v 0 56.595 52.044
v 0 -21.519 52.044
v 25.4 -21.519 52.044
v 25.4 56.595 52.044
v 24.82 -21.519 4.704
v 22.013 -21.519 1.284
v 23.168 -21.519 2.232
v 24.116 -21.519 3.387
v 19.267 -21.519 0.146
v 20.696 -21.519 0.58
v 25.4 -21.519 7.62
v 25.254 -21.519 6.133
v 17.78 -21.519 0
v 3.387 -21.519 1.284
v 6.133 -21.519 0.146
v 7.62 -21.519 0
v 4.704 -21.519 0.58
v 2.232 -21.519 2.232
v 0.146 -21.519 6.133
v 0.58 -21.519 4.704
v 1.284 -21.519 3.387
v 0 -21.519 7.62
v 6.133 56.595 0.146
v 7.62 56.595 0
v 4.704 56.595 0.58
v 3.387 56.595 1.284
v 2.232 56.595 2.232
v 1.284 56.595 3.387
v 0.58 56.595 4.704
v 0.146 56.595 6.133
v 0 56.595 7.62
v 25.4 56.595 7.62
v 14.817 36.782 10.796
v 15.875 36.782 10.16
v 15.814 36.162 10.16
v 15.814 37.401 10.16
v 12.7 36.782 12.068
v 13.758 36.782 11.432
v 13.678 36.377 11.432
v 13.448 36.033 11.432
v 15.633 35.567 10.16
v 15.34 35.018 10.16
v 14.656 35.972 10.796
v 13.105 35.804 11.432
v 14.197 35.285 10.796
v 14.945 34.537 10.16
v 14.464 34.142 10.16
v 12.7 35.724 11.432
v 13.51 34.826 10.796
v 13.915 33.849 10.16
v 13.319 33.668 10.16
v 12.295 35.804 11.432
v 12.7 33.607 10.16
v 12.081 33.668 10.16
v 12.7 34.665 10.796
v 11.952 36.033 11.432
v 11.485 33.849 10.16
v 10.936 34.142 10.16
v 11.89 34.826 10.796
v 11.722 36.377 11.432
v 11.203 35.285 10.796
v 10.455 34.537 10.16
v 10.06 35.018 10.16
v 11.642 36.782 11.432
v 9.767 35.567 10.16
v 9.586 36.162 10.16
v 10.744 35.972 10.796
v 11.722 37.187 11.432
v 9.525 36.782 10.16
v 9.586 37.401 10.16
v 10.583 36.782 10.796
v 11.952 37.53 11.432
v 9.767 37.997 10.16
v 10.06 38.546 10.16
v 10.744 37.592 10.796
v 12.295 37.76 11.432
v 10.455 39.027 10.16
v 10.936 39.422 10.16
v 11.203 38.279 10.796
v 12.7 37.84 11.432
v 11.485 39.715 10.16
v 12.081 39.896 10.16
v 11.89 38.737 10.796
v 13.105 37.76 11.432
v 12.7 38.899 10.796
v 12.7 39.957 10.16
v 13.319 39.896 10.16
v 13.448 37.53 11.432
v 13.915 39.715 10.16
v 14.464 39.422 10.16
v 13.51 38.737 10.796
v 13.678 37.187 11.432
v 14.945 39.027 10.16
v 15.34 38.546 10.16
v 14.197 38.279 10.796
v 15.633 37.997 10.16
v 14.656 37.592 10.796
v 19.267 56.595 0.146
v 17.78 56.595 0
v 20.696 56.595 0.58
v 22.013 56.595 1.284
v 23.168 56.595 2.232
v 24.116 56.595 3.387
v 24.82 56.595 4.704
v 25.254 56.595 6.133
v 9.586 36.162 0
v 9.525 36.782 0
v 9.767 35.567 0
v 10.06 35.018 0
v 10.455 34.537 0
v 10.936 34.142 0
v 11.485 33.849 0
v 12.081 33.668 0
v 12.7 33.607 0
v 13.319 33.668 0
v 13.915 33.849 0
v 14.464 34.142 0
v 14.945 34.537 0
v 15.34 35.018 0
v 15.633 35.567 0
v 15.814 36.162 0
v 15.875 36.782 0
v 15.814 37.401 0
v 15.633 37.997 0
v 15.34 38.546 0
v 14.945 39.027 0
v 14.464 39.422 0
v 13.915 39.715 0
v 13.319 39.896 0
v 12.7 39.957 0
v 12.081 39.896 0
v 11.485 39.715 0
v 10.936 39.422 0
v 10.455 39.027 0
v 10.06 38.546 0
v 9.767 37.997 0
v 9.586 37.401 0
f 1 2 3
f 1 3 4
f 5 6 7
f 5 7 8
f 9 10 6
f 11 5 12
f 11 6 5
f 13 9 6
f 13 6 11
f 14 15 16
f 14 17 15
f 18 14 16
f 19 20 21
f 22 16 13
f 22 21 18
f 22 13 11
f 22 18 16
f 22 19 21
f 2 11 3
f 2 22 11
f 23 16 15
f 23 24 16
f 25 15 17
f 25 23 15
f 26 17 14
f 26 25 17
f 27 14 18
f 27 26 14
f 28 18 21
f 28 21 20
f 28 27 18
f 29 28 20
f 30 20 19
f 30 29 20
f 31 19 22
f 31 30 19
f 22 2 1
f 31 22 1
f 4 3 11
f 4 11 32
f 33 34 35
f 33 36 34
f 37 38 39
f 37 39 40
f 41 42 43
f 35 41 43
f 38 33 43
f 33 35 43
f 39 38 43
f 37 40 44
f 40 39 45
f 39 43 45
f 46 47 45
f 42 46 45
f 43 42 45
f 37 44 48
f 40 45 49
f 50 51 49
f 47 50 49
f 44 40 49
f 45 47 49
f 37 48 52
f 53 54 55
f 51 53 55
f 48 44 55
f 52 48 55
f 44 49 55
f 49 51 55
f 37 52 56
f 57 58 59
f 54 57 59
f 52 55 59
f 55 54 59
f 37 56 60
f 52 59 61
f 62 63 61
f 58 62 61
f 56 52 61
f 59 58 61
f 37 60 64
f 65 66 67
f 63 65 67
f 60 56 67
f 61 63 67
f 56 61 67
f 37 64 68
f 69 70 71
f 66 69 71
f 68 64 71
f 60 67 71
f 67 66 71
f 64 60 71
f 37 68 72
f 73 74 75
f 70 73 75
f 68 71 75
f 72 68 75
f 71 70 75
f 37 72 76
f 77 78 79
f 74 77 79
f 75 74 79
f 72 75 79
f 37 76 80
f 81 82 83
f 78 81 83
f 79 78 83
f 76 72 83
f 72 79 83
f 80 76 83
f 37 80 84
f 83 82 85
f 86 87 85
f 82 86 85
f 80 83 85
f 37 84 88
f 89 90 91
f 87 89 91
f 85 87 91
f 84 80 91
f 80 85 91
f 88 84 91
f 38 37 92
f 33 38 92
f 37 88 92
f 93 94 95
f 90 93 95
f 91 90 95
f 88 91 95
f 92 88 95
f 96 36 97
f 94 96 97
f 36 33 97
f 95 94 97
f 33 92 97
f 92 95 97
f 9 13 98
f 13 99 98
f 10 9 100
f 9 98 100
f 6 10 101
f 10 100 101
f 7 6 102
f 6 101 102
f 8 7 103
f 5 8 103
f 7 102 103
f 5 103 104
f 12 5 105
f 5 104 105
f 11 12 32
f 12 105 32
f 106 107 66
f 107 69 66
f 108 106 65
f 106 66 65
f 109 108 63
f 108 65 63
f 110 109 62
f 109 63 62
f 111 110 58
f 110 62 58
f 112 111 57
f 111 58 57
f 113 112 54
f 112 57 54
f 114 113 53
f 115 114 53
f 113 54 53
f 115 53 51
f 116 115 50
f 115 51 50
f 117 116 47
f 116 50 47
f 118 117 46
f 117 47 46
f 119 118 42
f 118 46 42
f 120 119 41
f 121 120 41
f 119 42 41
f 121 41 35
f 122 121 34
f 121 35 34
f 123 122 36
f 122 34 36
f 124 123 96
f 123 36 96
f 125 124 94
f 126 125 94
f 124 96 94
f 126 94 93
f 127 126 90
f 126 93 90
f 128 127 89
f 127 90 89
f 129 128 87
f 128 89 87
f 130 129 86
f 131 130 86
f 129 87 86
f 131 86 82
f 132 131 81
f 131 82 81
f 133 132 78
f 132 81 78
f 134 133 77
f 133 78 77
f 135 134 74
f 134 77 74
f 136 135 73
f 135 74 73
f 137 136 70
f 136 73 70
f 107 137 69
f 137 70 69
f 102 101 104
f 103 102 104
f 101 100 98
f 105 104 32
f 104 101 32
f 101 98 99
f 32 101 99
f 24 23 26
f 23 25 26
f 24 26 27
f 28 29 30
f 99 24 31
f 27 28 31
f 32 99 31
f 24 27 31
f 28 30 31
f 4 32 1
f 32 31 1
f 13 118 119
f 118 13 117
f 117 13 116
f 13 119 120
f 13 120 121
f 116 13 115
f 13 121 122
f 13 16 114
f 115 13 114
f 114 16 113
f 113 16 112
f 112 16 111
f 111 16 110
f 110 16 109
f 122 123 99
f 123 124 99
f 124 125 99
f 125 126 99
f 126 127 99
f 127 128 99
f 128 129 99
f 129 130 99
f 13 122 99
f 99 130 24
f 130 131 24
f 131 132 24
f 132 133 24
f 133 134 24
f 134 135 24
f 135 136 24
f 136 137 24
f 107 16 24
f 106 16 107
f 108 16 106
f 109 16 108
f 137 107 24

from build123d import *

# Parameters (mm, degrees)
F0_W     = 78.1140327454
F0_H     = 52.0444214344
F1_DEPTH = 25.4
F2_R     = 7.62
F3_R     = 7.62
F5_D     = 6.35
F5_DEPTH = 10.16
F5_TIP   = 1.9077324654


with BuildPart() as f1:
    # F0 (on Right) → F1 (new body)
    with BuildSketch(Plane.YZ):
        with Locations((17.5377391279, 26.0222107172)):
            Rectangle(F0_W, F0_H)
    extrude(amount=F1_DEPTH)

    # F2
    f2_edges = [f1.edges().sort_by_distance(p)[0] for p in [
        (0, 17.537739, 0),
    ]]
    fillet(f2_edges, radius=F2_R)

    # F3
    f3_edges = [f1.edges().sort_by_distance(p)[0] for p in [
        (25.4, 17.537739, 0),
    ]]
    fillet(f3_edges, radius=F3_R)

    # F5
    with Locations(Plane(origin=(0, 0, 0), x_dir=(1, 0, 0), z_dir=(0, 0, -1))):
        with Locations((12.7, -36.7818512022)):
            Hole(F5_D / 2, depth=F5_DEPTH)
            with Locations((0, 0, -(F5_DEPTH + F5_TIP / 2))):  # 118° drill point
                Cone(0, F5_D / 2, F5_TIP, mode=Mode.SUBTRACT)


solid = f1.part
